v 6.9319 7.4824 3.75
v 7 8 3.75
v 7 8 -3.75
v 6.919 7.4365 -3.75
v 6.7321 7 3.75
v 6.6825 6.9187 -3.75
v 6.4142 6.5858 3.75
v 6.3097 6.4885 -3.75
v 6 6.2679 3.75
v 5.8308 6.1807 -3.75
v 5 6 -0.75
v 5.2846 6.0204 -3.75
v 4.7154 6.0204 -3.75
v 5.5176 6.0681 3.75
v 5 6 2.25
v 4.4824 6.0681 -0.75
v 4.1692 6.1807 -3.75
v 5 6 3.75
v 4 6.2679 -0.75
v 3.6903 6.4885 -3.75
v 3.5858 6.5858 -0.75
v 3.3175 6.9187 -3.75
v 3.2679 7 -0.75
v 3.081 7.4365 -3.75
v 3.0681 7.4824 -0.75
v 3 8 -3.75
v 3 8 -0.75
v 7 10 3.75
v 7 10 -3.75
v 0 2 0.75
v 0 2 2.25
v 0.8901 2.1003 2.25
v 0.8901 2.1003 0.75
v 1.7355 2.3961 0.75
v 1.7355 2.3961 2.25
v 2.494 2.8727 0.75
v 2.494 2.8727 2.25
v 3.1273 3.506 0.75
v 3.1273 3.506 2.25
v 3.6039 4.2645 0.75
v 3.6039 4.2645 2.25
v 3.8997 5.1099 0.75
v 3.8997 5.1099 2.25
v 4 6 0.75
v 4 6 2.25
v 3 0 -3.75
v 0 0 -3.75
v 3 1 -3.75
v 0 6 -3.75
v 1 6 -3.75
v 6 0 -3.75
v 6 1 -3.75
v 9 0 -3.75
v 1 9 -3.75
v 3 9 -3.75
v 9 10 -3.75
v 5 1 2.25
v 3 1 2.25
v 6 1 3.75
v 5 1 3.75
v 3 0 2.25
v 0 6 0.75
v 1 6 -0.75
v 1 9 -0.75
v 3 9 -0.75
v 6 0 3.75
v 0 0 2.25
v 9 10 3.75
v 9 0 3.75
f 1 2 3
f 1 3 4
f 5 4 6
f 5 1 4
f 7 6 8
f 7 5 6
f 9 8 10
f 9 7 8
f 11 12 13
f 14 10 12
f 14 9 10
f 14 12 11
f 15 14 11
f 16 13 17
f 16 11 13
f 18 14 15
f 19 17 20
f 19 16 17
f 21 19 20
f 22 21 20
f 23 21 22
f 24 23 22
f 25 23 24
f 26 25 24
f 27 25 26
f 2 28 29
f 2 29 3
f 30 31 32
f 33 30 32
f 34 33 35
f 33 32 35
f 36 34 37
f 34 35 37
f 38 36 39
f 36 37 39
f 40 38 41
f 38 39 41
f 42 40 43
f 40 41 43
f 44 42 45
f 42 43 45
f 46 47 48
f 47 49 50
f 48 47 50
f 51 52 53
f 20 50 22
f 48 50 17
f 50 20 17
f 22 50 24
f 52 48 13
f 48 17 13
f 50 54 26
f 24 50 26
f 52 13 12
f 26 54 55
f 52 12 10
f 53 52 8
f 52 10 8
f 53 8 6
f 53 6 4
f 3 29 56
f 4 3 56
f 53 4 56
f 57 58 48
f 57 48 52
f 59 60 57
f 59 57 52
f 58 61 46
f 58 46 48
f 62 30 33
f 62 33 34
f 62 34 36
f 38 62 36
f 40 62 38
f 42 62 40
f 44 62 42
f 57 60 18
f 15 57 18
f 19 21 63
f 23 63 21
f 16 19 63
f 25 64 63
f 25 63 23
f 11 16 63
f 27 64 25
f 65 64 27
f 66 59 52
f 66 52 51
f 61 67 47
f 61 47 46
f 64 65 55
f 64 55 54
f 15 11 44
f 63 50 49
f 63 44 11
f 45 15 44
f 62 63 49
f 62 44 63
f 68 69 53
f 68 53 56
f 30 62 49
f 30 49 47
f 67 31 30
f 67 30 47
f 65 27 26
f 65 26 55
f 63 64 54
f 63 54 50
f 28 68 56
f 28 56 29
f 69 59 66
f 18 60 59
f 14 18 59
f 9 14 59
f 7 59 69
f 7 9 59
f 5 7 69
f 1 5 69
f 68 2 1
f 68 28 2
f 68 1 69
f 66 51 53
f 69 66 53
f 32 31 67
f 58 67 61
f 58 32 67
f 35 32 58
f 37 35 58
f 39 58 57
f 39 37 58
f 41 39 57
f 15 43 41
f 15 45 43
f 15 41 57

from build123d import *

# Parameters (mm, degrees)
BOSS_EXTRUDE1_DEPTH = 3.75
SKETCH2_W           = 4
SKETCH2_H           = 4.100690398
CUT_EXTRUDE1_DEPTH  = 4.5
SKETCH3_W           = 5
SKETCH3_H           = 9.939403745
CUT_EXTRUDE2_DEPTH  = 1.5
CUT_EXTRUDE3_DEPTH  = 1.5


with BuildPart() as part:
    # Sketch1 → Boss-Extrude1 (new body, symmetric)
    with BuildSketch(Plane.XY):
        with BuildLine():
            Line((0, 6), (0, 0))
            Line((0, 0), (3, 0))
            Line((3, 0), (3, 1))
            Line((3, 1), (6, 1))
            Line((6, 1), (6, 0))
            Line((6, 0), (9, 0))
            Line((9, 0), (9, 10))
            Line((9, 10), (7, 10))
            Line((7, 10), (7, 8))
            ThreePointArc((7, 8), (5, 6), (3, 8))
            Line((3, 8), (3, 9))
            Line((3, 9), (1, 9))
            Line((1, 9), (1, 6))
            Line((1, 6), (0, 6))
        make_face()
    extrude(amount=BOSS_EXTRUDE1_DEPTH, both=True)

    # Sketch2 → Cut-Extrude1 (cut)
    with BuildSketch(Plane.XY.offset(3.75)):
        with Locations((3, 8.050345199)):
            Rectangle(SKETCH2_W, SKETCH2_H)
    extrude(amount=-CUT_EXTRUDE1_DEPTH, mode=Mode.SUBTRACT)

    # Sketch3 → Cut-Extrude2 (cut)
    with BuildSketch(Plane.XY.offset(3.75)):
        with Locations((2.5, 4.969701872)):
            Rectangle(SKETCH3_W, SKETCH3_H)
    extrude(amount=-CUT_EXTRUDE2_DEPTH, mode=Mode.SUBTRACT)

    # Sketch4 → Cut-Extrude3 (cut)
    with BuildSketch(Plane.XY.offset(2.25)):
        with BuildLine():
            Line((4, 6), (0, 6))
            Line((0, 6), (0, 2))
            ThreePointArc((0, 2), (2.828427125, 3.171572875), (4, 6))
        make_face()
    extrude(amount=-CUT_EXTRUDE3_DEPTH, mode=Mode.SUBTRACT)


solid = part.part
